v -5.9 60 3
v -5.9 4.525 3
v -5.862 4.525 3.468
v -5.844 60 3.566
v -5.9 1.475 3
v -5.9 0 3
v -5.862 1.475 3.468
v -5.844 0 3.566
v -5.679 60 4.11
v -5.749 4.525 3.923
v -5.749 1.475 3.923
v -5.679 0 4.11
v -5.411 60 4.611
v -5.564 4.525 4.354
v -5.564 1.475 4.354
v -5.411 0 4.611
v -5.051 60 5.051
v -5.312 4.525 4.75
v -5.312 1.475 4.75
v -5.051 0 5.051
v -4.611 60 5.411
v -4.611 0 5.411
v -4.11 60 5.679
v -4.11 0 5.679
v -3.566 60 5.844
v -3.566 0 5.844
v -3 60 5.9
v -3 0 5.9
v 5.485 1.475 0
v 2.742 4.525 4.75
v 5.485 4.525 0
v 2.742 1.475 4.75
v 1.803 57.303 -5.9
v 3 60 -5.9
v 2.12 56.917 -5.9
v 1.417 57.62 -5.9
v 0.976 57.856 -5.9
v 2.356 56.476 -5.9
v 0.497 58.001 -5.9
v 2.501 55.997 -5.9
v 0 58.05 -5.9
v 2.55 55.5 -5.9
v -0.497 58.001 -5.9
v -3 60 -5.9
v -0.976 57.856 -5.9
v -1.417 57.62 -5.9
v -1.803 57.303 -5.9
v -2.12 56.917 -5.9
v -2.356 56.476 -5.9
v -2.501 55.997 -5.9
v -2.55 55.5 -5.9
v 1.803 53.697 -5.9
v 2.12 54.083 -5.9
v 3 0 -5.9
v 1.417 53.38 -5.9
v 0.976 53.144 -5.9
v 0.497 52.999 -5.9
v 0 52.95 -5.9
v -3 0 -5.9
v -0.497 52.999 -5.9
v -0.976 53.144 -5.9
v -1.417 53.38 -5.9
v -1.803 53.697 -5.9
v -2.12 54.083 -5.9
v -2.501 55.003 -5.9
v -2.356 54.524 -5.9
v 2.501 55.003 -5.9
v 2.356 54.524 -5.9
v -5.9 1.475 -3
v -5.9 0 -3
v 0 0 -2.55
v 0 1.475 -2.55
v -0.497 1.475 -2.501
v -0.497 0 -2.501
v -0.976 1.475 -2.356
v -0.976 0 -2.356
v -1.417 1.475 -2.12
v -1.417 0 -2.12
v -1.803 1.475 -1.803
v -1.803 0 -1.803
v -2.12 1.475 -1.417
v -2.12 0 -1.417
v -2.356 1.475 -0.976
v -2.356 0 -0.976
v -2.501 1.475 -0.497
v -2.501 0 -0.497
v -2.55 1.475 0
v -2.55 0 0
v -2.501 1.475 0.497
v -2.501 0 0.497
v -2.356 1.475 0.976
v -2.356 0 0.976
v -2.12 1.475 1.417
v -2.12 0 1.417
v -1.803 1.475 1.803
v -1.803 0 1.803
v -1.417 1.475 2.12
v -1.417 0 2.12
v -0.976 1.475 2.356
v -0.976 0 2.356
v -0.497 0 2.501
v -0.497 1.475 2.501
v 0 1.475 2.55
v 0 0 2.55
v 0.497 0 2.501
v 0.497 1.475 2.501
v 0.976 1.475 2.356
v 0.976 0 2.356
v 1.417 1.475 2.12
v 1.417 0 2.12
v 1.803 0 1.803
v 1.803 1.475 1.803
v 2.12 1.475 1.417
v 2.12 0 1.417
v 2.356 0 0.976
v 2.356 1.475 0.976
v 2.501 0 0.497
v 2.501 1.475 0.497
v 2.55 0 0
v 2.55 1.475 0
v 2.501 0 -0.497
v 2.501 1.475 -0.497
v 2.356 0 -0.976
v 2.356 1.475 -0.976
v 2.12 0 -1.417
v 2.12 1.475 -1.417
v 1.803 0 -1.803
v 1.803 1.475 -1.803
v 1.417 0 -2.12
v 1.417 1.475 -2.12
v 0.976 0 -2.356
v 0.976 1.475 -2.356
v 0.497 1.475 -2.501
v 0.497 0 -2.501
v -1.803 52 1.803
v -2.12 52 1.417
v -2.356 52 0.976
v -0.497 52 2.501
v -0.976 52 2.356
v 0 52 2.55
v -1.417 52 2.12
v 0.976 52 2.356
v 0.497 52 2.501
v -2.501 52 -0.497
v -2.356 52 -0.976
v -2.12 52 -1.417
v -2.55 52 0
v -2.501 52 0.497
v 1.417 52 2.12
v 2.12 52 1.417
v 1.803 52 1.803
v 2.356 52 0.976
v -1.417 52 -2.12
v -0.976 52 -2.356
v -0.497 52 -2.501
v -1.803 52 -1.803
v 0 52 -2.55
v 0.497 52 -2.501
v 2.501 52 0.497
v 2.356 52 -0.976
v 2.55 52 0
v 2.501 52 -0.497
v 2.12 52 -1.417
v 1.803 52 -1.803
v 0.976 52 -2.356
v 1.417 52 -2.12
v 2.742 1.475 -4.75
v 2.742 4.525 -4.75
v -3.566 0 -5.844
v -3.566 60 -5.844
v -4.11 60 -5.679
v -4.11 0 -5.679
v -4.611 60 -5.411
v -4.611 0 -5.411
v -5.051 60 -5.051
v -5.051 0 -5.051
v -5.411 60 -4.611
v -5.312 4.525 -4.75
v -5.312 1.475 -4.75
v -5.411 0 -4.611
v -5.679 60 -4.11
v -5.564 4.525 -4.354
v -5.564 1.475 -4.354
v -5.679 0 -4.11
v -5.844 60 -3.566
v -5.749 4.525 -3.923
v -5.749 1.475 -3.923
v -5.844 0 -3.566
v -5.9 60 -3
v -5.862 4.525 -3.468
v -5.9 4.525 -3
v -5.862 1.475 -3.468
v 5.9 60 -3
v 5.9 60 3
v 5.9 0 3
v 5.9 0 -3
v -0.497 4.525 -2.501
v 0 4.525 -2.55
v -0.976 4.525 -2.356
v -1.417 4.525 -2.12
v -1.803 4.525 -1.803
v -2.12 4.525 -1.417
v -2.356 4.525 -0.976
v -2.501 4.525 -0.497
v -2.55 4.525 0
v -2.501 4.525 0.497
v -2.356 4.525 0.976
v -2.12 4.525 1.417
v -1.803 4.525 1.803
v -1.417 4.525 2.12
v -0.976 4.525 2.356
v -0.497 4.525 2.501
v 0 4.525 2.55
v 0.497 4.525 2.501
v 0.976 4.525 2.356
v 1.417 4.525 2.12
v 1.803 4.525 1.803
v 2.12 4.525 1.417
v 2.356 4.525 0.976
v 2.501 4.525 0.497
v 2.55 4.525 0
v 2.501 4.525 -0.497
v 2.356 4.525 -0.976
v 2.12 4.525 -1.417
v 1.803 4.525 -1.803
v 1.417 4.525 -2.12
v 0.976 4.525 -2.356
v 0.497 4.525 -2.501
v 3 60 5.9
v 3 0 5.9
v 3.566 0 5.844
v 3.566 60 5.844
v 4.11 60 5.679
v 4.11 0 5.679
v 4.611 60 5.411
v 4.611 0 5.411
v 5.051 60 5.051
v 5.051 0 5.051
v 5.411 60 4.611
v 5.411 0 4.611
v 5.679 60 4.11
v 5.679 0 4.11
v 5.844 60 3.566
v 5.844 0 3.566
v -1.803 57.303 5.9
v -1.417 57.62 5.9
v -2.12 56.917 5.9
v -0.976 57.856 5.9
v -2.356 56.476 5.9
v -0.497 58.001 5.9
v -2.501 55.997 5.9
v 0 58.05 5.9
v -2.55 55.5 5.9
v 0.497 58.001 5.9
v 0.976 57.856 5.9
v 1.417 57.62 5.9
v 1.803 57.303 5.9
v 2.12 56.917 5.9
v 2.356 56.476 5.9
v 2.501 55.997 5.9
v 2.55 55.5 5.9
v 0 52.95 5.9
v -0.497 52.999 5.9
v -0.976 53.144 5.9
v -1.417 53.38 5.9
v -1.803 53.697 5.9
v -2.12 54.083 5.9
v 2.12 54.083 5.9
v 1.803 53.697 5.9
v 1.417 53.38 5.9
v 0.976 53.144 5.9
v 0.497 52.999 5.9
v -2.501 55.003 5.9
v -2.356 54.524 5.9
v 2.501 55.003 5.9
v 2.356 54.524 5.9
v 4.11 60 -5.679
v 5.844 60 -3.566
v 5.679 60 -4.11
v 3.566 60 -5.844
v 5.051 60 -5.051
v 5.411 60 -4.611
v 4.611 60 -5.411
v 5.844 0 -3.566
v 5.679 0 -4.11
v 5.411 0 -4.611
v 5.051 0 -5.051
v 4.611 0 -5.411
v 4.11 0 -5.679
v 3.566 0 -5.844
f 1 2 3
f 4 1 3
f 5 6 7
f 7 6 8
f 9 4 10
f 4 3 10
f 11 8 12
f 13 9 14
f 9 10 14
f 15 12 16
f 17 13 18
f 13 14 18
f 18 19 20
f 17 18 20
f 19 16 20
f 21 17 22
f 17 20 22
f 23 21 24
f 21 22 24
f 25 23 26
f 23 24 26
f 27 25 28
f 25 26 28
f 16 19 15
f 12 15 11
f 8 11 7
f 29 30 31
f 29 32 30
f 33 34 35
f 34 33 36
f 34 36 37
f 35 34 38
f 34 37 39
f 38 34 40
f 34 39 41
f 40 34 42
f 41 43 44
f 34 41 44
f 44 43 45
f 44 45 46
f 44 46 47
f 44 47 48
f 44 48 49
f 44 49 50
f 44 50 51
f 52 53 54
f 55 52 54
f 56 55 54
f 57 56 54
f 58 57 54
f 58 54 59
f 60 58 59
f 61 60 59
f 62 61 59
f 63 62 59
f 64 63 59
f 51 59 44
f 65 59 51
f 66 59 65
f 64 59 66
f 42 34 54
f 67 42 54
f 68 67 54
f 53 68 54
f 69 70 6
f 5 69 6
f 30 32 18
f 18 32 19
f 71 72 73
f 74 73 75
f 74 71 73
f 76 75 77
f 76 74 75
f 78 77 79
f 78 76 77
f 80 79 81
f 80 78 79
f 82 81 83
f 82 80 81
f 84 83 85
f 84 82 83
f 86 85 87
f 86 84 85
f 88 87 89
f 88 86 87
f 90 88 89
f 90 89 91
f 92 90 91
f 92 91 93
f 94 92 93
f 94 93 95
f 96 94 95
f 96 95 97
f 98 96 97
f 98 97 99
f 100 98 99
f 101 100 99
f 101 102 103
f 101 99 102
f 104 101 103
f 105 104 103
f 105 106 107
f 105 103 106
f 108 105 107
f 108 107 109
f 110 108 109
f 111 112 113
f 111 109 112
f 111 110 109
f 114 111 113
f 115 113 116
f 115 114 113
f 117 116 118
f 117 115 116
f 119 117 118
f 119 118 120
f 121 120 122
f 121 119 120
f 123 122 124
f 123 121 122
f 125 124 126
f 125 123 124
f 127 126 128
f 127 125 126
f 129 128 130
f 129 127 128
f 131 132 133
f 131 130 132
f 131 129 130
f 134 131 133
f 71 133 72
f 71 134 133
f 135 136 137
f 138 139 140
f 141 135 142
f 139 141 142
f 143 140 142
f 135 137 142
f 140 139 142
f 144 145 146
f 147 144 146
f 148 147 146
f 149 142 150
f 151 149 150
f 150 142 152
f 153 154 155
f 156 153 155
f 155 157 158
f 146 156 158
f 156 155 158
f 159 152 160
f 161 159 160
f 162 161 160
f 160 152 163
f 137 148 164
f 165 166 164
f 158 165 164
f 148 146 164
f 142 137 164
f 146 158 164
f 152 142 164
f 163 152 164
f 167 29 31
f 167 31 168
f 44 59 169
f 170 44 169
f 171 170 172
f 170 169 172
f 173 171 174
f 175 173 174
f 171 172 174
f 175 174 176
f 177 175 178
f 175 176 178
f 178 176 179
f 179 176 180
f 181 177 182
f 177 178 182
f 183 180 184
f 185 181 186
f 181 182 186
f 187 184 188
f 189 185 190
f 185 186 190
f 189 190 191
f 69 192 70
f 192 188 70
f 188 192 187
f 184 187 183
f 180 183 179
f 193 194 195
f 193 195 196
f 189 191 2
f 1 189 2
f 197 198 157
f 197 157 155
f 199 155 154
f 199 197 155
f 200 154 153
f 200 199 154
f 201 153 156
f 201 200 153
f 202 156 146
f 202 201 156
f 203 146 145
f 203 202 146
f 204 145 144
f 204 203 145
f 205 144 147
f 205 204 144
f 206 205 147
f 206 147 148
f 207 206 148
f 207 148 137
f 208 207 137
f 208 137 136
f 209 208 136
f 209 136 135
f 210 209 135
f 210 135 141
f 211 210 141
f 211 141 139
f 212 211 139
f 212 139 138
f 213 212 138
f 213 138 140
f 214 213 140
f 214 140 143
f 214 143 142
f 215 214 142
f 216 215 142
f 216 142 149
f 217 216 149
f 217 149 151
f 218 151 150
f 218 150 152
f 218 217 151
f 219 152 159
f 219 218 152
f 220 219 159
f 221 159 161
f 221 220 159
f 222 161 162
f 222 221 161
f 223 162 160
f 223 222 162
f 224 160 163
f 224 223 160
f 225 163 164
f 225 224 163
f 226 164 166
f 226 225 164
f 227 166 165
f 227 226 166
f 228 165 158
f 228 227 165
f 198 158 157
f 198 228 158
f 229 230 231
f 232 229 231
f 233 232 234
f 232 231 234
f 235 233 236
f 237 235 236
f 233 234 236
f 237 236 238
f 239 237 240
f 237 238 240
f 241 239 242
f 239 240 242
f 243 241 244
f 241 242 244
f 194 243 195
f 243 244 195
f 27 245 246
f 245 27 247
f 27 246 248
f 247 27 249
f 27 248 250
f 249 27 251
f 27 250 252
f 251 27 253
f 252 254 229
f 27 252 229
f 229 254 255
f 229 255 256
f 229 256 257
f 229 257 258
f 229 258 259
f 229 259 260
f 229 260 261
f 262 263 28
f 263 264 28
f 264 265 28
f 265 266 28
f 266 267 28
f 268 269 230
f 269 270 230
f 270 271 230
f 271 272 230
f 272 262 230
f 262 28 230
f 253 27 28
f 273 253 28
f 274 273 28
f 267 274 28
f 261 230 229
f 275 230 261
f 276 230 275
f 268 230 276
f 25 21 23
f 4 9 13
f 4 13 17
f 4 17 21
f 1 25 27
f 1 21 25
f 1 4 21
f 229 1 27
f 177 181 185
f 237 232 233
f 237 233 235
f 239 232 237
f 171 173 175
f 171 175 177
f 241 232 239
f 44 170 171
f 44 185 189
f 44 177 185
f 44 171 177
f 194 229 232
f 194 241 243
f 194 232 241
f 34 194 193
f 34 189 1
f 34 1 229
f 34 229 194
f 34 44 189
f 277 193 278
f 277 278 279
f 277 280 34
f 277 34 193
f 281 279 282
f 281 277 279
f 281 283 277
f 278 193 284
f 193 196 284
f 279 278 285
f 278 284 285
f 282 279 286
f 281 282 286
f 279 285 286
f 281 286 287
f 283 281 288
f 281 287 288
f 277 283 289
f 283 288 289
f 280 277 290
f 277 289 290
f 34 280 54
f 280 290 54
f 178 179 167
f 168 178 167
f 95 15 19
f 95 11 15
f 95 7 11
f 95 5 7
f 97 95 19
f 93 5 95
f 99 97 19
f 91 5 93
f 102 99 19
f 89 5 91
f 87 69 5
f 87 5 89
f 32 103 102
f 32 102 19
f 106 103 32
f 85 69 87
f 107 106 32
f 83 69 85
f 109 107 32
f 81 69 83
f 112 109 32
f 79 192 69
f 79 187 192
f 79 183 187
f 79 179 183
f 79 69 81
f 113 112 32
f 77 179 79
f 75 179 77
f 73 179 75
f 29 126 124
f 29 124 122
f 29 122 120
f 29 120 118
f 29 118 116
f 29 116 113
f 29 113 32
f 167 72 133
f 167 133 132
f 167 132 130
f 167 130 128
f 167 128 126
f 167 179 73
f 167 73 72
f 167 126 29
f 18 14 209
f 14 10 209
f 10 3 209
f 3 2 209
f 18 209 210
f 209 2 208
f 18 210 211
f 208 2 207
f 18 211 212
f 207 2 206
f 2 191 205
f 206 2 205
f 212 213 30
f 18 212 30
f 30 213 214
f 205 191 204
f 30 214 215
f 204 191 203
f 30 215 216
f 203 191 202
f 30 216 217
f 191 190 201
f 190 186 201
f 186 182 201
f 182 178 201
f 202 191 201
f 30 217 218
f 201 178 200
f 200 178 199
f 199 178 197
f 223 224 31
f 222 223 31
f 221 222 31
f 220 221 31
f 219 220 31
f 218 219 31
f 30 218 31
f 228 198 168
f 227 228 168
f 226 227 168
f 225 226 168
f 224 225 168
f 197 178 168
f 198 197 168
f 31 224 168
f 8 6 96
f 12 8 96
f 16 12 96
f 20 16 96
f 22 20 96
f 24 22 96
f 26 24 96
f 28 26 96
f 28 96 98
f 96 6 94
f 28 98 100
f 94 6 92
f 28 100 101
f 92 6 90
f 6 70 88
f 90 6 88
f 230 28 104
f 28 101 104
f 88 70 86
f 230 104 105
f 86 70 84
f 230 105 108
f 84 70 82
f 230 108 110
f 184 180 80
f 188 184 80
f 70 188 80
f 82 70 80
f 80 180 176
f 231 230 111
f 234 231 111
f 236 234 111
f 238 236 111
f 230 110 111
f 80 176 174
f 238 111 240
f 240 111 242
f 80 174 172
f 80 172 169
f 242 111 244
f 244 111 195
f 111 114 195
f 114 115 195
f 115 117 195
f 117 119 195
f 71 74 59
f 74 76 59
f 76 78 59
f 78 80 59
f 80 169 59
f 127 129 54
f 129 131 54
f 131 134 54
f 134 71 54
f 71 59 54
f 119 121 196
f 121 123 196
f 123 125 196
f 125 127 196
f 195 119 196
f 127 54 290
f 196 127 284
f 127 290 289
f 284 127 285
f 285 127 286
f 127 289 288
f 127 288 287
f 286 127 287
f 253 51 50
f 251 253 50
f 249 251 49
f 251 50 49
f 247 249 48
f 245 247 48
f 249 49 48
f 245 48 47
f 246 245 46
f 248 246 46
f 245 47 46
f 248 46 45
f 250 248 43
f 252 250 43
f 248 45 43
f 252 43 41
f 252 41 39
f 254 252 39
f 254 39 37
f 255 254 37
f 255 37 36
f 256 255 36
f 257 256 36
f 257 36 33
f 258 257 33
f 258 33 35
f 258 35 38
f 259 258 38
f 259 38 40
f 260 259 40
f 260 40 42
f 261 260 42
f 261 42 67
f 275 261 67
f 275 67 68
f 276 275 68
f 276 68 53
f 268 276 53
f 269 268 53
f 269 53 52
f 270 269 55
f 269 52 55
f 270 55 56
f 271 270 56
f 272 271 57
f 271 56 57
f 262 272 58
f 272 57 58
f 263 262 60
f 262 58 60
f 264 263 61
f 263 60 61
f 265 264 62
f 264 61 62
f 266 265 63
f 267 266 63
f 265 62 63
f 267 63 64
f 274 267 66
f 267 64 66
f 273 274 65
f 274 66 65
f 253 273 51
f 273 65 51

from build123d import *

# Parameters (mm, degrees)
SKETCH1_R           = 2.55
BOSS_EXTRUDE1_DEPTH = 52
BOSS_EXTRUDE2_DEPTH = 8
CUT_EXTRUDE1_DEPTH  = 1.525
SKETCH4_R           = 2.55
CUT_EXTRUDE2_DEPTH  = 62.43329716


with BuildPart() as part:
    # Sketch1 → Boss-Extrude1 (new body)
    with BuildSketch(Plane(origin=(0, 0, 0), x_dir=(1, 0, 0), z_dir=(0, 1, 0))):
        with BuildLine():
            Line((-3, -5.9), (3, -5.9))
            ThreePointArc((3, -5.9), (5.050609665, -5.050609665), (5.9, -3))
            Line((5.9, -3), (5.9, 3))
            ThreePointArc((5.9, 3), (5.050609665, 5.050609665), (3, 5.9))
            Line((3, 5.9), (-3, 5.9))
            ThreePointArc((-3, 5.9), (-5.050609665, 5.050609665), (-5.9, 3))
            Line((-5.9, 3), (-5.9, -3))
            ThreePointArc((-5.9, -3), (-5.050609665, -5.050609665), (-3, -5.9))
        make_face()
        with Locations(Location((0, 0, 0), (0, 0, 90))):
            Circle(SKETCH1_R, mode=Mode.SUBTRACT)
    extrude(amount=BOSS_EXTRUDE1_DEPTH)

    # Sketch2 → Boss-Extrude2 (add)
    with BuildSketch(Plane(origin=(0, 52, 0), x_dir=(1, 0, 0), z_dir=(0, 1, 0))):
        with BuildLine():
            Line((5.9, -3), (5.9, 3))
            ThreePointArc((5.9, 3), (5.050609665, 5.050609665), (3, 5.9))
            Line((3, 5.9), (-3, 5.9))
            ThreePointArc((-3, 5.9), (-5.050609665, 5.050609665), (-5.9, 3))
            Line((-5.9, 3), (-5.9, -3))
            ThreePointArc((-5.9, -3), (-5.050609665, -5.050609665), (-3, -5.9))
            Line((-3, -5.9), (3, -5.9))
            ThreePointArc((3, -5.9), (5.050609665, -5.050609665), (5.9, -3))
        make_face()
    extrude(amount=BOSS_EXTRUDE2_DEPTH)

    # Sketch3 → Cut-Extrude1 (cut, symmetric)
    with BuildSketch(Plane(origin=(0, 3, 0), x_dir=(-1, 0, 0), z_dir=(0, -1, 0))):
        Polygon((2.742413779, 4.75), (6.305323331, 4.75), (6.305323331, -4.75), (2.742413779, -4.75), (-2.742413779, -4.75), (-5.484827557, 0), (-2.742413779, 4.75), align=None)
    extrude(amount=CUT_EXTRUDE1_DEPTH, both=True, mode=Mode.SUBTRACT)

    # Sketch4 → Cut-Extrude2 (cut, through all)
    with BuildSketch(Plane(origin=(0, 0, -5.9), x_dir=(-1, 0, 0), z_dir=(0, 0, -1))):
        with Locations((0, 55.5)):
            Circle(SKETCH4_R)
    extrude(amount=-CUT_EXTRUDE2_DEPTH, mode=Mode.SUBTRACT)


solid = part.part
